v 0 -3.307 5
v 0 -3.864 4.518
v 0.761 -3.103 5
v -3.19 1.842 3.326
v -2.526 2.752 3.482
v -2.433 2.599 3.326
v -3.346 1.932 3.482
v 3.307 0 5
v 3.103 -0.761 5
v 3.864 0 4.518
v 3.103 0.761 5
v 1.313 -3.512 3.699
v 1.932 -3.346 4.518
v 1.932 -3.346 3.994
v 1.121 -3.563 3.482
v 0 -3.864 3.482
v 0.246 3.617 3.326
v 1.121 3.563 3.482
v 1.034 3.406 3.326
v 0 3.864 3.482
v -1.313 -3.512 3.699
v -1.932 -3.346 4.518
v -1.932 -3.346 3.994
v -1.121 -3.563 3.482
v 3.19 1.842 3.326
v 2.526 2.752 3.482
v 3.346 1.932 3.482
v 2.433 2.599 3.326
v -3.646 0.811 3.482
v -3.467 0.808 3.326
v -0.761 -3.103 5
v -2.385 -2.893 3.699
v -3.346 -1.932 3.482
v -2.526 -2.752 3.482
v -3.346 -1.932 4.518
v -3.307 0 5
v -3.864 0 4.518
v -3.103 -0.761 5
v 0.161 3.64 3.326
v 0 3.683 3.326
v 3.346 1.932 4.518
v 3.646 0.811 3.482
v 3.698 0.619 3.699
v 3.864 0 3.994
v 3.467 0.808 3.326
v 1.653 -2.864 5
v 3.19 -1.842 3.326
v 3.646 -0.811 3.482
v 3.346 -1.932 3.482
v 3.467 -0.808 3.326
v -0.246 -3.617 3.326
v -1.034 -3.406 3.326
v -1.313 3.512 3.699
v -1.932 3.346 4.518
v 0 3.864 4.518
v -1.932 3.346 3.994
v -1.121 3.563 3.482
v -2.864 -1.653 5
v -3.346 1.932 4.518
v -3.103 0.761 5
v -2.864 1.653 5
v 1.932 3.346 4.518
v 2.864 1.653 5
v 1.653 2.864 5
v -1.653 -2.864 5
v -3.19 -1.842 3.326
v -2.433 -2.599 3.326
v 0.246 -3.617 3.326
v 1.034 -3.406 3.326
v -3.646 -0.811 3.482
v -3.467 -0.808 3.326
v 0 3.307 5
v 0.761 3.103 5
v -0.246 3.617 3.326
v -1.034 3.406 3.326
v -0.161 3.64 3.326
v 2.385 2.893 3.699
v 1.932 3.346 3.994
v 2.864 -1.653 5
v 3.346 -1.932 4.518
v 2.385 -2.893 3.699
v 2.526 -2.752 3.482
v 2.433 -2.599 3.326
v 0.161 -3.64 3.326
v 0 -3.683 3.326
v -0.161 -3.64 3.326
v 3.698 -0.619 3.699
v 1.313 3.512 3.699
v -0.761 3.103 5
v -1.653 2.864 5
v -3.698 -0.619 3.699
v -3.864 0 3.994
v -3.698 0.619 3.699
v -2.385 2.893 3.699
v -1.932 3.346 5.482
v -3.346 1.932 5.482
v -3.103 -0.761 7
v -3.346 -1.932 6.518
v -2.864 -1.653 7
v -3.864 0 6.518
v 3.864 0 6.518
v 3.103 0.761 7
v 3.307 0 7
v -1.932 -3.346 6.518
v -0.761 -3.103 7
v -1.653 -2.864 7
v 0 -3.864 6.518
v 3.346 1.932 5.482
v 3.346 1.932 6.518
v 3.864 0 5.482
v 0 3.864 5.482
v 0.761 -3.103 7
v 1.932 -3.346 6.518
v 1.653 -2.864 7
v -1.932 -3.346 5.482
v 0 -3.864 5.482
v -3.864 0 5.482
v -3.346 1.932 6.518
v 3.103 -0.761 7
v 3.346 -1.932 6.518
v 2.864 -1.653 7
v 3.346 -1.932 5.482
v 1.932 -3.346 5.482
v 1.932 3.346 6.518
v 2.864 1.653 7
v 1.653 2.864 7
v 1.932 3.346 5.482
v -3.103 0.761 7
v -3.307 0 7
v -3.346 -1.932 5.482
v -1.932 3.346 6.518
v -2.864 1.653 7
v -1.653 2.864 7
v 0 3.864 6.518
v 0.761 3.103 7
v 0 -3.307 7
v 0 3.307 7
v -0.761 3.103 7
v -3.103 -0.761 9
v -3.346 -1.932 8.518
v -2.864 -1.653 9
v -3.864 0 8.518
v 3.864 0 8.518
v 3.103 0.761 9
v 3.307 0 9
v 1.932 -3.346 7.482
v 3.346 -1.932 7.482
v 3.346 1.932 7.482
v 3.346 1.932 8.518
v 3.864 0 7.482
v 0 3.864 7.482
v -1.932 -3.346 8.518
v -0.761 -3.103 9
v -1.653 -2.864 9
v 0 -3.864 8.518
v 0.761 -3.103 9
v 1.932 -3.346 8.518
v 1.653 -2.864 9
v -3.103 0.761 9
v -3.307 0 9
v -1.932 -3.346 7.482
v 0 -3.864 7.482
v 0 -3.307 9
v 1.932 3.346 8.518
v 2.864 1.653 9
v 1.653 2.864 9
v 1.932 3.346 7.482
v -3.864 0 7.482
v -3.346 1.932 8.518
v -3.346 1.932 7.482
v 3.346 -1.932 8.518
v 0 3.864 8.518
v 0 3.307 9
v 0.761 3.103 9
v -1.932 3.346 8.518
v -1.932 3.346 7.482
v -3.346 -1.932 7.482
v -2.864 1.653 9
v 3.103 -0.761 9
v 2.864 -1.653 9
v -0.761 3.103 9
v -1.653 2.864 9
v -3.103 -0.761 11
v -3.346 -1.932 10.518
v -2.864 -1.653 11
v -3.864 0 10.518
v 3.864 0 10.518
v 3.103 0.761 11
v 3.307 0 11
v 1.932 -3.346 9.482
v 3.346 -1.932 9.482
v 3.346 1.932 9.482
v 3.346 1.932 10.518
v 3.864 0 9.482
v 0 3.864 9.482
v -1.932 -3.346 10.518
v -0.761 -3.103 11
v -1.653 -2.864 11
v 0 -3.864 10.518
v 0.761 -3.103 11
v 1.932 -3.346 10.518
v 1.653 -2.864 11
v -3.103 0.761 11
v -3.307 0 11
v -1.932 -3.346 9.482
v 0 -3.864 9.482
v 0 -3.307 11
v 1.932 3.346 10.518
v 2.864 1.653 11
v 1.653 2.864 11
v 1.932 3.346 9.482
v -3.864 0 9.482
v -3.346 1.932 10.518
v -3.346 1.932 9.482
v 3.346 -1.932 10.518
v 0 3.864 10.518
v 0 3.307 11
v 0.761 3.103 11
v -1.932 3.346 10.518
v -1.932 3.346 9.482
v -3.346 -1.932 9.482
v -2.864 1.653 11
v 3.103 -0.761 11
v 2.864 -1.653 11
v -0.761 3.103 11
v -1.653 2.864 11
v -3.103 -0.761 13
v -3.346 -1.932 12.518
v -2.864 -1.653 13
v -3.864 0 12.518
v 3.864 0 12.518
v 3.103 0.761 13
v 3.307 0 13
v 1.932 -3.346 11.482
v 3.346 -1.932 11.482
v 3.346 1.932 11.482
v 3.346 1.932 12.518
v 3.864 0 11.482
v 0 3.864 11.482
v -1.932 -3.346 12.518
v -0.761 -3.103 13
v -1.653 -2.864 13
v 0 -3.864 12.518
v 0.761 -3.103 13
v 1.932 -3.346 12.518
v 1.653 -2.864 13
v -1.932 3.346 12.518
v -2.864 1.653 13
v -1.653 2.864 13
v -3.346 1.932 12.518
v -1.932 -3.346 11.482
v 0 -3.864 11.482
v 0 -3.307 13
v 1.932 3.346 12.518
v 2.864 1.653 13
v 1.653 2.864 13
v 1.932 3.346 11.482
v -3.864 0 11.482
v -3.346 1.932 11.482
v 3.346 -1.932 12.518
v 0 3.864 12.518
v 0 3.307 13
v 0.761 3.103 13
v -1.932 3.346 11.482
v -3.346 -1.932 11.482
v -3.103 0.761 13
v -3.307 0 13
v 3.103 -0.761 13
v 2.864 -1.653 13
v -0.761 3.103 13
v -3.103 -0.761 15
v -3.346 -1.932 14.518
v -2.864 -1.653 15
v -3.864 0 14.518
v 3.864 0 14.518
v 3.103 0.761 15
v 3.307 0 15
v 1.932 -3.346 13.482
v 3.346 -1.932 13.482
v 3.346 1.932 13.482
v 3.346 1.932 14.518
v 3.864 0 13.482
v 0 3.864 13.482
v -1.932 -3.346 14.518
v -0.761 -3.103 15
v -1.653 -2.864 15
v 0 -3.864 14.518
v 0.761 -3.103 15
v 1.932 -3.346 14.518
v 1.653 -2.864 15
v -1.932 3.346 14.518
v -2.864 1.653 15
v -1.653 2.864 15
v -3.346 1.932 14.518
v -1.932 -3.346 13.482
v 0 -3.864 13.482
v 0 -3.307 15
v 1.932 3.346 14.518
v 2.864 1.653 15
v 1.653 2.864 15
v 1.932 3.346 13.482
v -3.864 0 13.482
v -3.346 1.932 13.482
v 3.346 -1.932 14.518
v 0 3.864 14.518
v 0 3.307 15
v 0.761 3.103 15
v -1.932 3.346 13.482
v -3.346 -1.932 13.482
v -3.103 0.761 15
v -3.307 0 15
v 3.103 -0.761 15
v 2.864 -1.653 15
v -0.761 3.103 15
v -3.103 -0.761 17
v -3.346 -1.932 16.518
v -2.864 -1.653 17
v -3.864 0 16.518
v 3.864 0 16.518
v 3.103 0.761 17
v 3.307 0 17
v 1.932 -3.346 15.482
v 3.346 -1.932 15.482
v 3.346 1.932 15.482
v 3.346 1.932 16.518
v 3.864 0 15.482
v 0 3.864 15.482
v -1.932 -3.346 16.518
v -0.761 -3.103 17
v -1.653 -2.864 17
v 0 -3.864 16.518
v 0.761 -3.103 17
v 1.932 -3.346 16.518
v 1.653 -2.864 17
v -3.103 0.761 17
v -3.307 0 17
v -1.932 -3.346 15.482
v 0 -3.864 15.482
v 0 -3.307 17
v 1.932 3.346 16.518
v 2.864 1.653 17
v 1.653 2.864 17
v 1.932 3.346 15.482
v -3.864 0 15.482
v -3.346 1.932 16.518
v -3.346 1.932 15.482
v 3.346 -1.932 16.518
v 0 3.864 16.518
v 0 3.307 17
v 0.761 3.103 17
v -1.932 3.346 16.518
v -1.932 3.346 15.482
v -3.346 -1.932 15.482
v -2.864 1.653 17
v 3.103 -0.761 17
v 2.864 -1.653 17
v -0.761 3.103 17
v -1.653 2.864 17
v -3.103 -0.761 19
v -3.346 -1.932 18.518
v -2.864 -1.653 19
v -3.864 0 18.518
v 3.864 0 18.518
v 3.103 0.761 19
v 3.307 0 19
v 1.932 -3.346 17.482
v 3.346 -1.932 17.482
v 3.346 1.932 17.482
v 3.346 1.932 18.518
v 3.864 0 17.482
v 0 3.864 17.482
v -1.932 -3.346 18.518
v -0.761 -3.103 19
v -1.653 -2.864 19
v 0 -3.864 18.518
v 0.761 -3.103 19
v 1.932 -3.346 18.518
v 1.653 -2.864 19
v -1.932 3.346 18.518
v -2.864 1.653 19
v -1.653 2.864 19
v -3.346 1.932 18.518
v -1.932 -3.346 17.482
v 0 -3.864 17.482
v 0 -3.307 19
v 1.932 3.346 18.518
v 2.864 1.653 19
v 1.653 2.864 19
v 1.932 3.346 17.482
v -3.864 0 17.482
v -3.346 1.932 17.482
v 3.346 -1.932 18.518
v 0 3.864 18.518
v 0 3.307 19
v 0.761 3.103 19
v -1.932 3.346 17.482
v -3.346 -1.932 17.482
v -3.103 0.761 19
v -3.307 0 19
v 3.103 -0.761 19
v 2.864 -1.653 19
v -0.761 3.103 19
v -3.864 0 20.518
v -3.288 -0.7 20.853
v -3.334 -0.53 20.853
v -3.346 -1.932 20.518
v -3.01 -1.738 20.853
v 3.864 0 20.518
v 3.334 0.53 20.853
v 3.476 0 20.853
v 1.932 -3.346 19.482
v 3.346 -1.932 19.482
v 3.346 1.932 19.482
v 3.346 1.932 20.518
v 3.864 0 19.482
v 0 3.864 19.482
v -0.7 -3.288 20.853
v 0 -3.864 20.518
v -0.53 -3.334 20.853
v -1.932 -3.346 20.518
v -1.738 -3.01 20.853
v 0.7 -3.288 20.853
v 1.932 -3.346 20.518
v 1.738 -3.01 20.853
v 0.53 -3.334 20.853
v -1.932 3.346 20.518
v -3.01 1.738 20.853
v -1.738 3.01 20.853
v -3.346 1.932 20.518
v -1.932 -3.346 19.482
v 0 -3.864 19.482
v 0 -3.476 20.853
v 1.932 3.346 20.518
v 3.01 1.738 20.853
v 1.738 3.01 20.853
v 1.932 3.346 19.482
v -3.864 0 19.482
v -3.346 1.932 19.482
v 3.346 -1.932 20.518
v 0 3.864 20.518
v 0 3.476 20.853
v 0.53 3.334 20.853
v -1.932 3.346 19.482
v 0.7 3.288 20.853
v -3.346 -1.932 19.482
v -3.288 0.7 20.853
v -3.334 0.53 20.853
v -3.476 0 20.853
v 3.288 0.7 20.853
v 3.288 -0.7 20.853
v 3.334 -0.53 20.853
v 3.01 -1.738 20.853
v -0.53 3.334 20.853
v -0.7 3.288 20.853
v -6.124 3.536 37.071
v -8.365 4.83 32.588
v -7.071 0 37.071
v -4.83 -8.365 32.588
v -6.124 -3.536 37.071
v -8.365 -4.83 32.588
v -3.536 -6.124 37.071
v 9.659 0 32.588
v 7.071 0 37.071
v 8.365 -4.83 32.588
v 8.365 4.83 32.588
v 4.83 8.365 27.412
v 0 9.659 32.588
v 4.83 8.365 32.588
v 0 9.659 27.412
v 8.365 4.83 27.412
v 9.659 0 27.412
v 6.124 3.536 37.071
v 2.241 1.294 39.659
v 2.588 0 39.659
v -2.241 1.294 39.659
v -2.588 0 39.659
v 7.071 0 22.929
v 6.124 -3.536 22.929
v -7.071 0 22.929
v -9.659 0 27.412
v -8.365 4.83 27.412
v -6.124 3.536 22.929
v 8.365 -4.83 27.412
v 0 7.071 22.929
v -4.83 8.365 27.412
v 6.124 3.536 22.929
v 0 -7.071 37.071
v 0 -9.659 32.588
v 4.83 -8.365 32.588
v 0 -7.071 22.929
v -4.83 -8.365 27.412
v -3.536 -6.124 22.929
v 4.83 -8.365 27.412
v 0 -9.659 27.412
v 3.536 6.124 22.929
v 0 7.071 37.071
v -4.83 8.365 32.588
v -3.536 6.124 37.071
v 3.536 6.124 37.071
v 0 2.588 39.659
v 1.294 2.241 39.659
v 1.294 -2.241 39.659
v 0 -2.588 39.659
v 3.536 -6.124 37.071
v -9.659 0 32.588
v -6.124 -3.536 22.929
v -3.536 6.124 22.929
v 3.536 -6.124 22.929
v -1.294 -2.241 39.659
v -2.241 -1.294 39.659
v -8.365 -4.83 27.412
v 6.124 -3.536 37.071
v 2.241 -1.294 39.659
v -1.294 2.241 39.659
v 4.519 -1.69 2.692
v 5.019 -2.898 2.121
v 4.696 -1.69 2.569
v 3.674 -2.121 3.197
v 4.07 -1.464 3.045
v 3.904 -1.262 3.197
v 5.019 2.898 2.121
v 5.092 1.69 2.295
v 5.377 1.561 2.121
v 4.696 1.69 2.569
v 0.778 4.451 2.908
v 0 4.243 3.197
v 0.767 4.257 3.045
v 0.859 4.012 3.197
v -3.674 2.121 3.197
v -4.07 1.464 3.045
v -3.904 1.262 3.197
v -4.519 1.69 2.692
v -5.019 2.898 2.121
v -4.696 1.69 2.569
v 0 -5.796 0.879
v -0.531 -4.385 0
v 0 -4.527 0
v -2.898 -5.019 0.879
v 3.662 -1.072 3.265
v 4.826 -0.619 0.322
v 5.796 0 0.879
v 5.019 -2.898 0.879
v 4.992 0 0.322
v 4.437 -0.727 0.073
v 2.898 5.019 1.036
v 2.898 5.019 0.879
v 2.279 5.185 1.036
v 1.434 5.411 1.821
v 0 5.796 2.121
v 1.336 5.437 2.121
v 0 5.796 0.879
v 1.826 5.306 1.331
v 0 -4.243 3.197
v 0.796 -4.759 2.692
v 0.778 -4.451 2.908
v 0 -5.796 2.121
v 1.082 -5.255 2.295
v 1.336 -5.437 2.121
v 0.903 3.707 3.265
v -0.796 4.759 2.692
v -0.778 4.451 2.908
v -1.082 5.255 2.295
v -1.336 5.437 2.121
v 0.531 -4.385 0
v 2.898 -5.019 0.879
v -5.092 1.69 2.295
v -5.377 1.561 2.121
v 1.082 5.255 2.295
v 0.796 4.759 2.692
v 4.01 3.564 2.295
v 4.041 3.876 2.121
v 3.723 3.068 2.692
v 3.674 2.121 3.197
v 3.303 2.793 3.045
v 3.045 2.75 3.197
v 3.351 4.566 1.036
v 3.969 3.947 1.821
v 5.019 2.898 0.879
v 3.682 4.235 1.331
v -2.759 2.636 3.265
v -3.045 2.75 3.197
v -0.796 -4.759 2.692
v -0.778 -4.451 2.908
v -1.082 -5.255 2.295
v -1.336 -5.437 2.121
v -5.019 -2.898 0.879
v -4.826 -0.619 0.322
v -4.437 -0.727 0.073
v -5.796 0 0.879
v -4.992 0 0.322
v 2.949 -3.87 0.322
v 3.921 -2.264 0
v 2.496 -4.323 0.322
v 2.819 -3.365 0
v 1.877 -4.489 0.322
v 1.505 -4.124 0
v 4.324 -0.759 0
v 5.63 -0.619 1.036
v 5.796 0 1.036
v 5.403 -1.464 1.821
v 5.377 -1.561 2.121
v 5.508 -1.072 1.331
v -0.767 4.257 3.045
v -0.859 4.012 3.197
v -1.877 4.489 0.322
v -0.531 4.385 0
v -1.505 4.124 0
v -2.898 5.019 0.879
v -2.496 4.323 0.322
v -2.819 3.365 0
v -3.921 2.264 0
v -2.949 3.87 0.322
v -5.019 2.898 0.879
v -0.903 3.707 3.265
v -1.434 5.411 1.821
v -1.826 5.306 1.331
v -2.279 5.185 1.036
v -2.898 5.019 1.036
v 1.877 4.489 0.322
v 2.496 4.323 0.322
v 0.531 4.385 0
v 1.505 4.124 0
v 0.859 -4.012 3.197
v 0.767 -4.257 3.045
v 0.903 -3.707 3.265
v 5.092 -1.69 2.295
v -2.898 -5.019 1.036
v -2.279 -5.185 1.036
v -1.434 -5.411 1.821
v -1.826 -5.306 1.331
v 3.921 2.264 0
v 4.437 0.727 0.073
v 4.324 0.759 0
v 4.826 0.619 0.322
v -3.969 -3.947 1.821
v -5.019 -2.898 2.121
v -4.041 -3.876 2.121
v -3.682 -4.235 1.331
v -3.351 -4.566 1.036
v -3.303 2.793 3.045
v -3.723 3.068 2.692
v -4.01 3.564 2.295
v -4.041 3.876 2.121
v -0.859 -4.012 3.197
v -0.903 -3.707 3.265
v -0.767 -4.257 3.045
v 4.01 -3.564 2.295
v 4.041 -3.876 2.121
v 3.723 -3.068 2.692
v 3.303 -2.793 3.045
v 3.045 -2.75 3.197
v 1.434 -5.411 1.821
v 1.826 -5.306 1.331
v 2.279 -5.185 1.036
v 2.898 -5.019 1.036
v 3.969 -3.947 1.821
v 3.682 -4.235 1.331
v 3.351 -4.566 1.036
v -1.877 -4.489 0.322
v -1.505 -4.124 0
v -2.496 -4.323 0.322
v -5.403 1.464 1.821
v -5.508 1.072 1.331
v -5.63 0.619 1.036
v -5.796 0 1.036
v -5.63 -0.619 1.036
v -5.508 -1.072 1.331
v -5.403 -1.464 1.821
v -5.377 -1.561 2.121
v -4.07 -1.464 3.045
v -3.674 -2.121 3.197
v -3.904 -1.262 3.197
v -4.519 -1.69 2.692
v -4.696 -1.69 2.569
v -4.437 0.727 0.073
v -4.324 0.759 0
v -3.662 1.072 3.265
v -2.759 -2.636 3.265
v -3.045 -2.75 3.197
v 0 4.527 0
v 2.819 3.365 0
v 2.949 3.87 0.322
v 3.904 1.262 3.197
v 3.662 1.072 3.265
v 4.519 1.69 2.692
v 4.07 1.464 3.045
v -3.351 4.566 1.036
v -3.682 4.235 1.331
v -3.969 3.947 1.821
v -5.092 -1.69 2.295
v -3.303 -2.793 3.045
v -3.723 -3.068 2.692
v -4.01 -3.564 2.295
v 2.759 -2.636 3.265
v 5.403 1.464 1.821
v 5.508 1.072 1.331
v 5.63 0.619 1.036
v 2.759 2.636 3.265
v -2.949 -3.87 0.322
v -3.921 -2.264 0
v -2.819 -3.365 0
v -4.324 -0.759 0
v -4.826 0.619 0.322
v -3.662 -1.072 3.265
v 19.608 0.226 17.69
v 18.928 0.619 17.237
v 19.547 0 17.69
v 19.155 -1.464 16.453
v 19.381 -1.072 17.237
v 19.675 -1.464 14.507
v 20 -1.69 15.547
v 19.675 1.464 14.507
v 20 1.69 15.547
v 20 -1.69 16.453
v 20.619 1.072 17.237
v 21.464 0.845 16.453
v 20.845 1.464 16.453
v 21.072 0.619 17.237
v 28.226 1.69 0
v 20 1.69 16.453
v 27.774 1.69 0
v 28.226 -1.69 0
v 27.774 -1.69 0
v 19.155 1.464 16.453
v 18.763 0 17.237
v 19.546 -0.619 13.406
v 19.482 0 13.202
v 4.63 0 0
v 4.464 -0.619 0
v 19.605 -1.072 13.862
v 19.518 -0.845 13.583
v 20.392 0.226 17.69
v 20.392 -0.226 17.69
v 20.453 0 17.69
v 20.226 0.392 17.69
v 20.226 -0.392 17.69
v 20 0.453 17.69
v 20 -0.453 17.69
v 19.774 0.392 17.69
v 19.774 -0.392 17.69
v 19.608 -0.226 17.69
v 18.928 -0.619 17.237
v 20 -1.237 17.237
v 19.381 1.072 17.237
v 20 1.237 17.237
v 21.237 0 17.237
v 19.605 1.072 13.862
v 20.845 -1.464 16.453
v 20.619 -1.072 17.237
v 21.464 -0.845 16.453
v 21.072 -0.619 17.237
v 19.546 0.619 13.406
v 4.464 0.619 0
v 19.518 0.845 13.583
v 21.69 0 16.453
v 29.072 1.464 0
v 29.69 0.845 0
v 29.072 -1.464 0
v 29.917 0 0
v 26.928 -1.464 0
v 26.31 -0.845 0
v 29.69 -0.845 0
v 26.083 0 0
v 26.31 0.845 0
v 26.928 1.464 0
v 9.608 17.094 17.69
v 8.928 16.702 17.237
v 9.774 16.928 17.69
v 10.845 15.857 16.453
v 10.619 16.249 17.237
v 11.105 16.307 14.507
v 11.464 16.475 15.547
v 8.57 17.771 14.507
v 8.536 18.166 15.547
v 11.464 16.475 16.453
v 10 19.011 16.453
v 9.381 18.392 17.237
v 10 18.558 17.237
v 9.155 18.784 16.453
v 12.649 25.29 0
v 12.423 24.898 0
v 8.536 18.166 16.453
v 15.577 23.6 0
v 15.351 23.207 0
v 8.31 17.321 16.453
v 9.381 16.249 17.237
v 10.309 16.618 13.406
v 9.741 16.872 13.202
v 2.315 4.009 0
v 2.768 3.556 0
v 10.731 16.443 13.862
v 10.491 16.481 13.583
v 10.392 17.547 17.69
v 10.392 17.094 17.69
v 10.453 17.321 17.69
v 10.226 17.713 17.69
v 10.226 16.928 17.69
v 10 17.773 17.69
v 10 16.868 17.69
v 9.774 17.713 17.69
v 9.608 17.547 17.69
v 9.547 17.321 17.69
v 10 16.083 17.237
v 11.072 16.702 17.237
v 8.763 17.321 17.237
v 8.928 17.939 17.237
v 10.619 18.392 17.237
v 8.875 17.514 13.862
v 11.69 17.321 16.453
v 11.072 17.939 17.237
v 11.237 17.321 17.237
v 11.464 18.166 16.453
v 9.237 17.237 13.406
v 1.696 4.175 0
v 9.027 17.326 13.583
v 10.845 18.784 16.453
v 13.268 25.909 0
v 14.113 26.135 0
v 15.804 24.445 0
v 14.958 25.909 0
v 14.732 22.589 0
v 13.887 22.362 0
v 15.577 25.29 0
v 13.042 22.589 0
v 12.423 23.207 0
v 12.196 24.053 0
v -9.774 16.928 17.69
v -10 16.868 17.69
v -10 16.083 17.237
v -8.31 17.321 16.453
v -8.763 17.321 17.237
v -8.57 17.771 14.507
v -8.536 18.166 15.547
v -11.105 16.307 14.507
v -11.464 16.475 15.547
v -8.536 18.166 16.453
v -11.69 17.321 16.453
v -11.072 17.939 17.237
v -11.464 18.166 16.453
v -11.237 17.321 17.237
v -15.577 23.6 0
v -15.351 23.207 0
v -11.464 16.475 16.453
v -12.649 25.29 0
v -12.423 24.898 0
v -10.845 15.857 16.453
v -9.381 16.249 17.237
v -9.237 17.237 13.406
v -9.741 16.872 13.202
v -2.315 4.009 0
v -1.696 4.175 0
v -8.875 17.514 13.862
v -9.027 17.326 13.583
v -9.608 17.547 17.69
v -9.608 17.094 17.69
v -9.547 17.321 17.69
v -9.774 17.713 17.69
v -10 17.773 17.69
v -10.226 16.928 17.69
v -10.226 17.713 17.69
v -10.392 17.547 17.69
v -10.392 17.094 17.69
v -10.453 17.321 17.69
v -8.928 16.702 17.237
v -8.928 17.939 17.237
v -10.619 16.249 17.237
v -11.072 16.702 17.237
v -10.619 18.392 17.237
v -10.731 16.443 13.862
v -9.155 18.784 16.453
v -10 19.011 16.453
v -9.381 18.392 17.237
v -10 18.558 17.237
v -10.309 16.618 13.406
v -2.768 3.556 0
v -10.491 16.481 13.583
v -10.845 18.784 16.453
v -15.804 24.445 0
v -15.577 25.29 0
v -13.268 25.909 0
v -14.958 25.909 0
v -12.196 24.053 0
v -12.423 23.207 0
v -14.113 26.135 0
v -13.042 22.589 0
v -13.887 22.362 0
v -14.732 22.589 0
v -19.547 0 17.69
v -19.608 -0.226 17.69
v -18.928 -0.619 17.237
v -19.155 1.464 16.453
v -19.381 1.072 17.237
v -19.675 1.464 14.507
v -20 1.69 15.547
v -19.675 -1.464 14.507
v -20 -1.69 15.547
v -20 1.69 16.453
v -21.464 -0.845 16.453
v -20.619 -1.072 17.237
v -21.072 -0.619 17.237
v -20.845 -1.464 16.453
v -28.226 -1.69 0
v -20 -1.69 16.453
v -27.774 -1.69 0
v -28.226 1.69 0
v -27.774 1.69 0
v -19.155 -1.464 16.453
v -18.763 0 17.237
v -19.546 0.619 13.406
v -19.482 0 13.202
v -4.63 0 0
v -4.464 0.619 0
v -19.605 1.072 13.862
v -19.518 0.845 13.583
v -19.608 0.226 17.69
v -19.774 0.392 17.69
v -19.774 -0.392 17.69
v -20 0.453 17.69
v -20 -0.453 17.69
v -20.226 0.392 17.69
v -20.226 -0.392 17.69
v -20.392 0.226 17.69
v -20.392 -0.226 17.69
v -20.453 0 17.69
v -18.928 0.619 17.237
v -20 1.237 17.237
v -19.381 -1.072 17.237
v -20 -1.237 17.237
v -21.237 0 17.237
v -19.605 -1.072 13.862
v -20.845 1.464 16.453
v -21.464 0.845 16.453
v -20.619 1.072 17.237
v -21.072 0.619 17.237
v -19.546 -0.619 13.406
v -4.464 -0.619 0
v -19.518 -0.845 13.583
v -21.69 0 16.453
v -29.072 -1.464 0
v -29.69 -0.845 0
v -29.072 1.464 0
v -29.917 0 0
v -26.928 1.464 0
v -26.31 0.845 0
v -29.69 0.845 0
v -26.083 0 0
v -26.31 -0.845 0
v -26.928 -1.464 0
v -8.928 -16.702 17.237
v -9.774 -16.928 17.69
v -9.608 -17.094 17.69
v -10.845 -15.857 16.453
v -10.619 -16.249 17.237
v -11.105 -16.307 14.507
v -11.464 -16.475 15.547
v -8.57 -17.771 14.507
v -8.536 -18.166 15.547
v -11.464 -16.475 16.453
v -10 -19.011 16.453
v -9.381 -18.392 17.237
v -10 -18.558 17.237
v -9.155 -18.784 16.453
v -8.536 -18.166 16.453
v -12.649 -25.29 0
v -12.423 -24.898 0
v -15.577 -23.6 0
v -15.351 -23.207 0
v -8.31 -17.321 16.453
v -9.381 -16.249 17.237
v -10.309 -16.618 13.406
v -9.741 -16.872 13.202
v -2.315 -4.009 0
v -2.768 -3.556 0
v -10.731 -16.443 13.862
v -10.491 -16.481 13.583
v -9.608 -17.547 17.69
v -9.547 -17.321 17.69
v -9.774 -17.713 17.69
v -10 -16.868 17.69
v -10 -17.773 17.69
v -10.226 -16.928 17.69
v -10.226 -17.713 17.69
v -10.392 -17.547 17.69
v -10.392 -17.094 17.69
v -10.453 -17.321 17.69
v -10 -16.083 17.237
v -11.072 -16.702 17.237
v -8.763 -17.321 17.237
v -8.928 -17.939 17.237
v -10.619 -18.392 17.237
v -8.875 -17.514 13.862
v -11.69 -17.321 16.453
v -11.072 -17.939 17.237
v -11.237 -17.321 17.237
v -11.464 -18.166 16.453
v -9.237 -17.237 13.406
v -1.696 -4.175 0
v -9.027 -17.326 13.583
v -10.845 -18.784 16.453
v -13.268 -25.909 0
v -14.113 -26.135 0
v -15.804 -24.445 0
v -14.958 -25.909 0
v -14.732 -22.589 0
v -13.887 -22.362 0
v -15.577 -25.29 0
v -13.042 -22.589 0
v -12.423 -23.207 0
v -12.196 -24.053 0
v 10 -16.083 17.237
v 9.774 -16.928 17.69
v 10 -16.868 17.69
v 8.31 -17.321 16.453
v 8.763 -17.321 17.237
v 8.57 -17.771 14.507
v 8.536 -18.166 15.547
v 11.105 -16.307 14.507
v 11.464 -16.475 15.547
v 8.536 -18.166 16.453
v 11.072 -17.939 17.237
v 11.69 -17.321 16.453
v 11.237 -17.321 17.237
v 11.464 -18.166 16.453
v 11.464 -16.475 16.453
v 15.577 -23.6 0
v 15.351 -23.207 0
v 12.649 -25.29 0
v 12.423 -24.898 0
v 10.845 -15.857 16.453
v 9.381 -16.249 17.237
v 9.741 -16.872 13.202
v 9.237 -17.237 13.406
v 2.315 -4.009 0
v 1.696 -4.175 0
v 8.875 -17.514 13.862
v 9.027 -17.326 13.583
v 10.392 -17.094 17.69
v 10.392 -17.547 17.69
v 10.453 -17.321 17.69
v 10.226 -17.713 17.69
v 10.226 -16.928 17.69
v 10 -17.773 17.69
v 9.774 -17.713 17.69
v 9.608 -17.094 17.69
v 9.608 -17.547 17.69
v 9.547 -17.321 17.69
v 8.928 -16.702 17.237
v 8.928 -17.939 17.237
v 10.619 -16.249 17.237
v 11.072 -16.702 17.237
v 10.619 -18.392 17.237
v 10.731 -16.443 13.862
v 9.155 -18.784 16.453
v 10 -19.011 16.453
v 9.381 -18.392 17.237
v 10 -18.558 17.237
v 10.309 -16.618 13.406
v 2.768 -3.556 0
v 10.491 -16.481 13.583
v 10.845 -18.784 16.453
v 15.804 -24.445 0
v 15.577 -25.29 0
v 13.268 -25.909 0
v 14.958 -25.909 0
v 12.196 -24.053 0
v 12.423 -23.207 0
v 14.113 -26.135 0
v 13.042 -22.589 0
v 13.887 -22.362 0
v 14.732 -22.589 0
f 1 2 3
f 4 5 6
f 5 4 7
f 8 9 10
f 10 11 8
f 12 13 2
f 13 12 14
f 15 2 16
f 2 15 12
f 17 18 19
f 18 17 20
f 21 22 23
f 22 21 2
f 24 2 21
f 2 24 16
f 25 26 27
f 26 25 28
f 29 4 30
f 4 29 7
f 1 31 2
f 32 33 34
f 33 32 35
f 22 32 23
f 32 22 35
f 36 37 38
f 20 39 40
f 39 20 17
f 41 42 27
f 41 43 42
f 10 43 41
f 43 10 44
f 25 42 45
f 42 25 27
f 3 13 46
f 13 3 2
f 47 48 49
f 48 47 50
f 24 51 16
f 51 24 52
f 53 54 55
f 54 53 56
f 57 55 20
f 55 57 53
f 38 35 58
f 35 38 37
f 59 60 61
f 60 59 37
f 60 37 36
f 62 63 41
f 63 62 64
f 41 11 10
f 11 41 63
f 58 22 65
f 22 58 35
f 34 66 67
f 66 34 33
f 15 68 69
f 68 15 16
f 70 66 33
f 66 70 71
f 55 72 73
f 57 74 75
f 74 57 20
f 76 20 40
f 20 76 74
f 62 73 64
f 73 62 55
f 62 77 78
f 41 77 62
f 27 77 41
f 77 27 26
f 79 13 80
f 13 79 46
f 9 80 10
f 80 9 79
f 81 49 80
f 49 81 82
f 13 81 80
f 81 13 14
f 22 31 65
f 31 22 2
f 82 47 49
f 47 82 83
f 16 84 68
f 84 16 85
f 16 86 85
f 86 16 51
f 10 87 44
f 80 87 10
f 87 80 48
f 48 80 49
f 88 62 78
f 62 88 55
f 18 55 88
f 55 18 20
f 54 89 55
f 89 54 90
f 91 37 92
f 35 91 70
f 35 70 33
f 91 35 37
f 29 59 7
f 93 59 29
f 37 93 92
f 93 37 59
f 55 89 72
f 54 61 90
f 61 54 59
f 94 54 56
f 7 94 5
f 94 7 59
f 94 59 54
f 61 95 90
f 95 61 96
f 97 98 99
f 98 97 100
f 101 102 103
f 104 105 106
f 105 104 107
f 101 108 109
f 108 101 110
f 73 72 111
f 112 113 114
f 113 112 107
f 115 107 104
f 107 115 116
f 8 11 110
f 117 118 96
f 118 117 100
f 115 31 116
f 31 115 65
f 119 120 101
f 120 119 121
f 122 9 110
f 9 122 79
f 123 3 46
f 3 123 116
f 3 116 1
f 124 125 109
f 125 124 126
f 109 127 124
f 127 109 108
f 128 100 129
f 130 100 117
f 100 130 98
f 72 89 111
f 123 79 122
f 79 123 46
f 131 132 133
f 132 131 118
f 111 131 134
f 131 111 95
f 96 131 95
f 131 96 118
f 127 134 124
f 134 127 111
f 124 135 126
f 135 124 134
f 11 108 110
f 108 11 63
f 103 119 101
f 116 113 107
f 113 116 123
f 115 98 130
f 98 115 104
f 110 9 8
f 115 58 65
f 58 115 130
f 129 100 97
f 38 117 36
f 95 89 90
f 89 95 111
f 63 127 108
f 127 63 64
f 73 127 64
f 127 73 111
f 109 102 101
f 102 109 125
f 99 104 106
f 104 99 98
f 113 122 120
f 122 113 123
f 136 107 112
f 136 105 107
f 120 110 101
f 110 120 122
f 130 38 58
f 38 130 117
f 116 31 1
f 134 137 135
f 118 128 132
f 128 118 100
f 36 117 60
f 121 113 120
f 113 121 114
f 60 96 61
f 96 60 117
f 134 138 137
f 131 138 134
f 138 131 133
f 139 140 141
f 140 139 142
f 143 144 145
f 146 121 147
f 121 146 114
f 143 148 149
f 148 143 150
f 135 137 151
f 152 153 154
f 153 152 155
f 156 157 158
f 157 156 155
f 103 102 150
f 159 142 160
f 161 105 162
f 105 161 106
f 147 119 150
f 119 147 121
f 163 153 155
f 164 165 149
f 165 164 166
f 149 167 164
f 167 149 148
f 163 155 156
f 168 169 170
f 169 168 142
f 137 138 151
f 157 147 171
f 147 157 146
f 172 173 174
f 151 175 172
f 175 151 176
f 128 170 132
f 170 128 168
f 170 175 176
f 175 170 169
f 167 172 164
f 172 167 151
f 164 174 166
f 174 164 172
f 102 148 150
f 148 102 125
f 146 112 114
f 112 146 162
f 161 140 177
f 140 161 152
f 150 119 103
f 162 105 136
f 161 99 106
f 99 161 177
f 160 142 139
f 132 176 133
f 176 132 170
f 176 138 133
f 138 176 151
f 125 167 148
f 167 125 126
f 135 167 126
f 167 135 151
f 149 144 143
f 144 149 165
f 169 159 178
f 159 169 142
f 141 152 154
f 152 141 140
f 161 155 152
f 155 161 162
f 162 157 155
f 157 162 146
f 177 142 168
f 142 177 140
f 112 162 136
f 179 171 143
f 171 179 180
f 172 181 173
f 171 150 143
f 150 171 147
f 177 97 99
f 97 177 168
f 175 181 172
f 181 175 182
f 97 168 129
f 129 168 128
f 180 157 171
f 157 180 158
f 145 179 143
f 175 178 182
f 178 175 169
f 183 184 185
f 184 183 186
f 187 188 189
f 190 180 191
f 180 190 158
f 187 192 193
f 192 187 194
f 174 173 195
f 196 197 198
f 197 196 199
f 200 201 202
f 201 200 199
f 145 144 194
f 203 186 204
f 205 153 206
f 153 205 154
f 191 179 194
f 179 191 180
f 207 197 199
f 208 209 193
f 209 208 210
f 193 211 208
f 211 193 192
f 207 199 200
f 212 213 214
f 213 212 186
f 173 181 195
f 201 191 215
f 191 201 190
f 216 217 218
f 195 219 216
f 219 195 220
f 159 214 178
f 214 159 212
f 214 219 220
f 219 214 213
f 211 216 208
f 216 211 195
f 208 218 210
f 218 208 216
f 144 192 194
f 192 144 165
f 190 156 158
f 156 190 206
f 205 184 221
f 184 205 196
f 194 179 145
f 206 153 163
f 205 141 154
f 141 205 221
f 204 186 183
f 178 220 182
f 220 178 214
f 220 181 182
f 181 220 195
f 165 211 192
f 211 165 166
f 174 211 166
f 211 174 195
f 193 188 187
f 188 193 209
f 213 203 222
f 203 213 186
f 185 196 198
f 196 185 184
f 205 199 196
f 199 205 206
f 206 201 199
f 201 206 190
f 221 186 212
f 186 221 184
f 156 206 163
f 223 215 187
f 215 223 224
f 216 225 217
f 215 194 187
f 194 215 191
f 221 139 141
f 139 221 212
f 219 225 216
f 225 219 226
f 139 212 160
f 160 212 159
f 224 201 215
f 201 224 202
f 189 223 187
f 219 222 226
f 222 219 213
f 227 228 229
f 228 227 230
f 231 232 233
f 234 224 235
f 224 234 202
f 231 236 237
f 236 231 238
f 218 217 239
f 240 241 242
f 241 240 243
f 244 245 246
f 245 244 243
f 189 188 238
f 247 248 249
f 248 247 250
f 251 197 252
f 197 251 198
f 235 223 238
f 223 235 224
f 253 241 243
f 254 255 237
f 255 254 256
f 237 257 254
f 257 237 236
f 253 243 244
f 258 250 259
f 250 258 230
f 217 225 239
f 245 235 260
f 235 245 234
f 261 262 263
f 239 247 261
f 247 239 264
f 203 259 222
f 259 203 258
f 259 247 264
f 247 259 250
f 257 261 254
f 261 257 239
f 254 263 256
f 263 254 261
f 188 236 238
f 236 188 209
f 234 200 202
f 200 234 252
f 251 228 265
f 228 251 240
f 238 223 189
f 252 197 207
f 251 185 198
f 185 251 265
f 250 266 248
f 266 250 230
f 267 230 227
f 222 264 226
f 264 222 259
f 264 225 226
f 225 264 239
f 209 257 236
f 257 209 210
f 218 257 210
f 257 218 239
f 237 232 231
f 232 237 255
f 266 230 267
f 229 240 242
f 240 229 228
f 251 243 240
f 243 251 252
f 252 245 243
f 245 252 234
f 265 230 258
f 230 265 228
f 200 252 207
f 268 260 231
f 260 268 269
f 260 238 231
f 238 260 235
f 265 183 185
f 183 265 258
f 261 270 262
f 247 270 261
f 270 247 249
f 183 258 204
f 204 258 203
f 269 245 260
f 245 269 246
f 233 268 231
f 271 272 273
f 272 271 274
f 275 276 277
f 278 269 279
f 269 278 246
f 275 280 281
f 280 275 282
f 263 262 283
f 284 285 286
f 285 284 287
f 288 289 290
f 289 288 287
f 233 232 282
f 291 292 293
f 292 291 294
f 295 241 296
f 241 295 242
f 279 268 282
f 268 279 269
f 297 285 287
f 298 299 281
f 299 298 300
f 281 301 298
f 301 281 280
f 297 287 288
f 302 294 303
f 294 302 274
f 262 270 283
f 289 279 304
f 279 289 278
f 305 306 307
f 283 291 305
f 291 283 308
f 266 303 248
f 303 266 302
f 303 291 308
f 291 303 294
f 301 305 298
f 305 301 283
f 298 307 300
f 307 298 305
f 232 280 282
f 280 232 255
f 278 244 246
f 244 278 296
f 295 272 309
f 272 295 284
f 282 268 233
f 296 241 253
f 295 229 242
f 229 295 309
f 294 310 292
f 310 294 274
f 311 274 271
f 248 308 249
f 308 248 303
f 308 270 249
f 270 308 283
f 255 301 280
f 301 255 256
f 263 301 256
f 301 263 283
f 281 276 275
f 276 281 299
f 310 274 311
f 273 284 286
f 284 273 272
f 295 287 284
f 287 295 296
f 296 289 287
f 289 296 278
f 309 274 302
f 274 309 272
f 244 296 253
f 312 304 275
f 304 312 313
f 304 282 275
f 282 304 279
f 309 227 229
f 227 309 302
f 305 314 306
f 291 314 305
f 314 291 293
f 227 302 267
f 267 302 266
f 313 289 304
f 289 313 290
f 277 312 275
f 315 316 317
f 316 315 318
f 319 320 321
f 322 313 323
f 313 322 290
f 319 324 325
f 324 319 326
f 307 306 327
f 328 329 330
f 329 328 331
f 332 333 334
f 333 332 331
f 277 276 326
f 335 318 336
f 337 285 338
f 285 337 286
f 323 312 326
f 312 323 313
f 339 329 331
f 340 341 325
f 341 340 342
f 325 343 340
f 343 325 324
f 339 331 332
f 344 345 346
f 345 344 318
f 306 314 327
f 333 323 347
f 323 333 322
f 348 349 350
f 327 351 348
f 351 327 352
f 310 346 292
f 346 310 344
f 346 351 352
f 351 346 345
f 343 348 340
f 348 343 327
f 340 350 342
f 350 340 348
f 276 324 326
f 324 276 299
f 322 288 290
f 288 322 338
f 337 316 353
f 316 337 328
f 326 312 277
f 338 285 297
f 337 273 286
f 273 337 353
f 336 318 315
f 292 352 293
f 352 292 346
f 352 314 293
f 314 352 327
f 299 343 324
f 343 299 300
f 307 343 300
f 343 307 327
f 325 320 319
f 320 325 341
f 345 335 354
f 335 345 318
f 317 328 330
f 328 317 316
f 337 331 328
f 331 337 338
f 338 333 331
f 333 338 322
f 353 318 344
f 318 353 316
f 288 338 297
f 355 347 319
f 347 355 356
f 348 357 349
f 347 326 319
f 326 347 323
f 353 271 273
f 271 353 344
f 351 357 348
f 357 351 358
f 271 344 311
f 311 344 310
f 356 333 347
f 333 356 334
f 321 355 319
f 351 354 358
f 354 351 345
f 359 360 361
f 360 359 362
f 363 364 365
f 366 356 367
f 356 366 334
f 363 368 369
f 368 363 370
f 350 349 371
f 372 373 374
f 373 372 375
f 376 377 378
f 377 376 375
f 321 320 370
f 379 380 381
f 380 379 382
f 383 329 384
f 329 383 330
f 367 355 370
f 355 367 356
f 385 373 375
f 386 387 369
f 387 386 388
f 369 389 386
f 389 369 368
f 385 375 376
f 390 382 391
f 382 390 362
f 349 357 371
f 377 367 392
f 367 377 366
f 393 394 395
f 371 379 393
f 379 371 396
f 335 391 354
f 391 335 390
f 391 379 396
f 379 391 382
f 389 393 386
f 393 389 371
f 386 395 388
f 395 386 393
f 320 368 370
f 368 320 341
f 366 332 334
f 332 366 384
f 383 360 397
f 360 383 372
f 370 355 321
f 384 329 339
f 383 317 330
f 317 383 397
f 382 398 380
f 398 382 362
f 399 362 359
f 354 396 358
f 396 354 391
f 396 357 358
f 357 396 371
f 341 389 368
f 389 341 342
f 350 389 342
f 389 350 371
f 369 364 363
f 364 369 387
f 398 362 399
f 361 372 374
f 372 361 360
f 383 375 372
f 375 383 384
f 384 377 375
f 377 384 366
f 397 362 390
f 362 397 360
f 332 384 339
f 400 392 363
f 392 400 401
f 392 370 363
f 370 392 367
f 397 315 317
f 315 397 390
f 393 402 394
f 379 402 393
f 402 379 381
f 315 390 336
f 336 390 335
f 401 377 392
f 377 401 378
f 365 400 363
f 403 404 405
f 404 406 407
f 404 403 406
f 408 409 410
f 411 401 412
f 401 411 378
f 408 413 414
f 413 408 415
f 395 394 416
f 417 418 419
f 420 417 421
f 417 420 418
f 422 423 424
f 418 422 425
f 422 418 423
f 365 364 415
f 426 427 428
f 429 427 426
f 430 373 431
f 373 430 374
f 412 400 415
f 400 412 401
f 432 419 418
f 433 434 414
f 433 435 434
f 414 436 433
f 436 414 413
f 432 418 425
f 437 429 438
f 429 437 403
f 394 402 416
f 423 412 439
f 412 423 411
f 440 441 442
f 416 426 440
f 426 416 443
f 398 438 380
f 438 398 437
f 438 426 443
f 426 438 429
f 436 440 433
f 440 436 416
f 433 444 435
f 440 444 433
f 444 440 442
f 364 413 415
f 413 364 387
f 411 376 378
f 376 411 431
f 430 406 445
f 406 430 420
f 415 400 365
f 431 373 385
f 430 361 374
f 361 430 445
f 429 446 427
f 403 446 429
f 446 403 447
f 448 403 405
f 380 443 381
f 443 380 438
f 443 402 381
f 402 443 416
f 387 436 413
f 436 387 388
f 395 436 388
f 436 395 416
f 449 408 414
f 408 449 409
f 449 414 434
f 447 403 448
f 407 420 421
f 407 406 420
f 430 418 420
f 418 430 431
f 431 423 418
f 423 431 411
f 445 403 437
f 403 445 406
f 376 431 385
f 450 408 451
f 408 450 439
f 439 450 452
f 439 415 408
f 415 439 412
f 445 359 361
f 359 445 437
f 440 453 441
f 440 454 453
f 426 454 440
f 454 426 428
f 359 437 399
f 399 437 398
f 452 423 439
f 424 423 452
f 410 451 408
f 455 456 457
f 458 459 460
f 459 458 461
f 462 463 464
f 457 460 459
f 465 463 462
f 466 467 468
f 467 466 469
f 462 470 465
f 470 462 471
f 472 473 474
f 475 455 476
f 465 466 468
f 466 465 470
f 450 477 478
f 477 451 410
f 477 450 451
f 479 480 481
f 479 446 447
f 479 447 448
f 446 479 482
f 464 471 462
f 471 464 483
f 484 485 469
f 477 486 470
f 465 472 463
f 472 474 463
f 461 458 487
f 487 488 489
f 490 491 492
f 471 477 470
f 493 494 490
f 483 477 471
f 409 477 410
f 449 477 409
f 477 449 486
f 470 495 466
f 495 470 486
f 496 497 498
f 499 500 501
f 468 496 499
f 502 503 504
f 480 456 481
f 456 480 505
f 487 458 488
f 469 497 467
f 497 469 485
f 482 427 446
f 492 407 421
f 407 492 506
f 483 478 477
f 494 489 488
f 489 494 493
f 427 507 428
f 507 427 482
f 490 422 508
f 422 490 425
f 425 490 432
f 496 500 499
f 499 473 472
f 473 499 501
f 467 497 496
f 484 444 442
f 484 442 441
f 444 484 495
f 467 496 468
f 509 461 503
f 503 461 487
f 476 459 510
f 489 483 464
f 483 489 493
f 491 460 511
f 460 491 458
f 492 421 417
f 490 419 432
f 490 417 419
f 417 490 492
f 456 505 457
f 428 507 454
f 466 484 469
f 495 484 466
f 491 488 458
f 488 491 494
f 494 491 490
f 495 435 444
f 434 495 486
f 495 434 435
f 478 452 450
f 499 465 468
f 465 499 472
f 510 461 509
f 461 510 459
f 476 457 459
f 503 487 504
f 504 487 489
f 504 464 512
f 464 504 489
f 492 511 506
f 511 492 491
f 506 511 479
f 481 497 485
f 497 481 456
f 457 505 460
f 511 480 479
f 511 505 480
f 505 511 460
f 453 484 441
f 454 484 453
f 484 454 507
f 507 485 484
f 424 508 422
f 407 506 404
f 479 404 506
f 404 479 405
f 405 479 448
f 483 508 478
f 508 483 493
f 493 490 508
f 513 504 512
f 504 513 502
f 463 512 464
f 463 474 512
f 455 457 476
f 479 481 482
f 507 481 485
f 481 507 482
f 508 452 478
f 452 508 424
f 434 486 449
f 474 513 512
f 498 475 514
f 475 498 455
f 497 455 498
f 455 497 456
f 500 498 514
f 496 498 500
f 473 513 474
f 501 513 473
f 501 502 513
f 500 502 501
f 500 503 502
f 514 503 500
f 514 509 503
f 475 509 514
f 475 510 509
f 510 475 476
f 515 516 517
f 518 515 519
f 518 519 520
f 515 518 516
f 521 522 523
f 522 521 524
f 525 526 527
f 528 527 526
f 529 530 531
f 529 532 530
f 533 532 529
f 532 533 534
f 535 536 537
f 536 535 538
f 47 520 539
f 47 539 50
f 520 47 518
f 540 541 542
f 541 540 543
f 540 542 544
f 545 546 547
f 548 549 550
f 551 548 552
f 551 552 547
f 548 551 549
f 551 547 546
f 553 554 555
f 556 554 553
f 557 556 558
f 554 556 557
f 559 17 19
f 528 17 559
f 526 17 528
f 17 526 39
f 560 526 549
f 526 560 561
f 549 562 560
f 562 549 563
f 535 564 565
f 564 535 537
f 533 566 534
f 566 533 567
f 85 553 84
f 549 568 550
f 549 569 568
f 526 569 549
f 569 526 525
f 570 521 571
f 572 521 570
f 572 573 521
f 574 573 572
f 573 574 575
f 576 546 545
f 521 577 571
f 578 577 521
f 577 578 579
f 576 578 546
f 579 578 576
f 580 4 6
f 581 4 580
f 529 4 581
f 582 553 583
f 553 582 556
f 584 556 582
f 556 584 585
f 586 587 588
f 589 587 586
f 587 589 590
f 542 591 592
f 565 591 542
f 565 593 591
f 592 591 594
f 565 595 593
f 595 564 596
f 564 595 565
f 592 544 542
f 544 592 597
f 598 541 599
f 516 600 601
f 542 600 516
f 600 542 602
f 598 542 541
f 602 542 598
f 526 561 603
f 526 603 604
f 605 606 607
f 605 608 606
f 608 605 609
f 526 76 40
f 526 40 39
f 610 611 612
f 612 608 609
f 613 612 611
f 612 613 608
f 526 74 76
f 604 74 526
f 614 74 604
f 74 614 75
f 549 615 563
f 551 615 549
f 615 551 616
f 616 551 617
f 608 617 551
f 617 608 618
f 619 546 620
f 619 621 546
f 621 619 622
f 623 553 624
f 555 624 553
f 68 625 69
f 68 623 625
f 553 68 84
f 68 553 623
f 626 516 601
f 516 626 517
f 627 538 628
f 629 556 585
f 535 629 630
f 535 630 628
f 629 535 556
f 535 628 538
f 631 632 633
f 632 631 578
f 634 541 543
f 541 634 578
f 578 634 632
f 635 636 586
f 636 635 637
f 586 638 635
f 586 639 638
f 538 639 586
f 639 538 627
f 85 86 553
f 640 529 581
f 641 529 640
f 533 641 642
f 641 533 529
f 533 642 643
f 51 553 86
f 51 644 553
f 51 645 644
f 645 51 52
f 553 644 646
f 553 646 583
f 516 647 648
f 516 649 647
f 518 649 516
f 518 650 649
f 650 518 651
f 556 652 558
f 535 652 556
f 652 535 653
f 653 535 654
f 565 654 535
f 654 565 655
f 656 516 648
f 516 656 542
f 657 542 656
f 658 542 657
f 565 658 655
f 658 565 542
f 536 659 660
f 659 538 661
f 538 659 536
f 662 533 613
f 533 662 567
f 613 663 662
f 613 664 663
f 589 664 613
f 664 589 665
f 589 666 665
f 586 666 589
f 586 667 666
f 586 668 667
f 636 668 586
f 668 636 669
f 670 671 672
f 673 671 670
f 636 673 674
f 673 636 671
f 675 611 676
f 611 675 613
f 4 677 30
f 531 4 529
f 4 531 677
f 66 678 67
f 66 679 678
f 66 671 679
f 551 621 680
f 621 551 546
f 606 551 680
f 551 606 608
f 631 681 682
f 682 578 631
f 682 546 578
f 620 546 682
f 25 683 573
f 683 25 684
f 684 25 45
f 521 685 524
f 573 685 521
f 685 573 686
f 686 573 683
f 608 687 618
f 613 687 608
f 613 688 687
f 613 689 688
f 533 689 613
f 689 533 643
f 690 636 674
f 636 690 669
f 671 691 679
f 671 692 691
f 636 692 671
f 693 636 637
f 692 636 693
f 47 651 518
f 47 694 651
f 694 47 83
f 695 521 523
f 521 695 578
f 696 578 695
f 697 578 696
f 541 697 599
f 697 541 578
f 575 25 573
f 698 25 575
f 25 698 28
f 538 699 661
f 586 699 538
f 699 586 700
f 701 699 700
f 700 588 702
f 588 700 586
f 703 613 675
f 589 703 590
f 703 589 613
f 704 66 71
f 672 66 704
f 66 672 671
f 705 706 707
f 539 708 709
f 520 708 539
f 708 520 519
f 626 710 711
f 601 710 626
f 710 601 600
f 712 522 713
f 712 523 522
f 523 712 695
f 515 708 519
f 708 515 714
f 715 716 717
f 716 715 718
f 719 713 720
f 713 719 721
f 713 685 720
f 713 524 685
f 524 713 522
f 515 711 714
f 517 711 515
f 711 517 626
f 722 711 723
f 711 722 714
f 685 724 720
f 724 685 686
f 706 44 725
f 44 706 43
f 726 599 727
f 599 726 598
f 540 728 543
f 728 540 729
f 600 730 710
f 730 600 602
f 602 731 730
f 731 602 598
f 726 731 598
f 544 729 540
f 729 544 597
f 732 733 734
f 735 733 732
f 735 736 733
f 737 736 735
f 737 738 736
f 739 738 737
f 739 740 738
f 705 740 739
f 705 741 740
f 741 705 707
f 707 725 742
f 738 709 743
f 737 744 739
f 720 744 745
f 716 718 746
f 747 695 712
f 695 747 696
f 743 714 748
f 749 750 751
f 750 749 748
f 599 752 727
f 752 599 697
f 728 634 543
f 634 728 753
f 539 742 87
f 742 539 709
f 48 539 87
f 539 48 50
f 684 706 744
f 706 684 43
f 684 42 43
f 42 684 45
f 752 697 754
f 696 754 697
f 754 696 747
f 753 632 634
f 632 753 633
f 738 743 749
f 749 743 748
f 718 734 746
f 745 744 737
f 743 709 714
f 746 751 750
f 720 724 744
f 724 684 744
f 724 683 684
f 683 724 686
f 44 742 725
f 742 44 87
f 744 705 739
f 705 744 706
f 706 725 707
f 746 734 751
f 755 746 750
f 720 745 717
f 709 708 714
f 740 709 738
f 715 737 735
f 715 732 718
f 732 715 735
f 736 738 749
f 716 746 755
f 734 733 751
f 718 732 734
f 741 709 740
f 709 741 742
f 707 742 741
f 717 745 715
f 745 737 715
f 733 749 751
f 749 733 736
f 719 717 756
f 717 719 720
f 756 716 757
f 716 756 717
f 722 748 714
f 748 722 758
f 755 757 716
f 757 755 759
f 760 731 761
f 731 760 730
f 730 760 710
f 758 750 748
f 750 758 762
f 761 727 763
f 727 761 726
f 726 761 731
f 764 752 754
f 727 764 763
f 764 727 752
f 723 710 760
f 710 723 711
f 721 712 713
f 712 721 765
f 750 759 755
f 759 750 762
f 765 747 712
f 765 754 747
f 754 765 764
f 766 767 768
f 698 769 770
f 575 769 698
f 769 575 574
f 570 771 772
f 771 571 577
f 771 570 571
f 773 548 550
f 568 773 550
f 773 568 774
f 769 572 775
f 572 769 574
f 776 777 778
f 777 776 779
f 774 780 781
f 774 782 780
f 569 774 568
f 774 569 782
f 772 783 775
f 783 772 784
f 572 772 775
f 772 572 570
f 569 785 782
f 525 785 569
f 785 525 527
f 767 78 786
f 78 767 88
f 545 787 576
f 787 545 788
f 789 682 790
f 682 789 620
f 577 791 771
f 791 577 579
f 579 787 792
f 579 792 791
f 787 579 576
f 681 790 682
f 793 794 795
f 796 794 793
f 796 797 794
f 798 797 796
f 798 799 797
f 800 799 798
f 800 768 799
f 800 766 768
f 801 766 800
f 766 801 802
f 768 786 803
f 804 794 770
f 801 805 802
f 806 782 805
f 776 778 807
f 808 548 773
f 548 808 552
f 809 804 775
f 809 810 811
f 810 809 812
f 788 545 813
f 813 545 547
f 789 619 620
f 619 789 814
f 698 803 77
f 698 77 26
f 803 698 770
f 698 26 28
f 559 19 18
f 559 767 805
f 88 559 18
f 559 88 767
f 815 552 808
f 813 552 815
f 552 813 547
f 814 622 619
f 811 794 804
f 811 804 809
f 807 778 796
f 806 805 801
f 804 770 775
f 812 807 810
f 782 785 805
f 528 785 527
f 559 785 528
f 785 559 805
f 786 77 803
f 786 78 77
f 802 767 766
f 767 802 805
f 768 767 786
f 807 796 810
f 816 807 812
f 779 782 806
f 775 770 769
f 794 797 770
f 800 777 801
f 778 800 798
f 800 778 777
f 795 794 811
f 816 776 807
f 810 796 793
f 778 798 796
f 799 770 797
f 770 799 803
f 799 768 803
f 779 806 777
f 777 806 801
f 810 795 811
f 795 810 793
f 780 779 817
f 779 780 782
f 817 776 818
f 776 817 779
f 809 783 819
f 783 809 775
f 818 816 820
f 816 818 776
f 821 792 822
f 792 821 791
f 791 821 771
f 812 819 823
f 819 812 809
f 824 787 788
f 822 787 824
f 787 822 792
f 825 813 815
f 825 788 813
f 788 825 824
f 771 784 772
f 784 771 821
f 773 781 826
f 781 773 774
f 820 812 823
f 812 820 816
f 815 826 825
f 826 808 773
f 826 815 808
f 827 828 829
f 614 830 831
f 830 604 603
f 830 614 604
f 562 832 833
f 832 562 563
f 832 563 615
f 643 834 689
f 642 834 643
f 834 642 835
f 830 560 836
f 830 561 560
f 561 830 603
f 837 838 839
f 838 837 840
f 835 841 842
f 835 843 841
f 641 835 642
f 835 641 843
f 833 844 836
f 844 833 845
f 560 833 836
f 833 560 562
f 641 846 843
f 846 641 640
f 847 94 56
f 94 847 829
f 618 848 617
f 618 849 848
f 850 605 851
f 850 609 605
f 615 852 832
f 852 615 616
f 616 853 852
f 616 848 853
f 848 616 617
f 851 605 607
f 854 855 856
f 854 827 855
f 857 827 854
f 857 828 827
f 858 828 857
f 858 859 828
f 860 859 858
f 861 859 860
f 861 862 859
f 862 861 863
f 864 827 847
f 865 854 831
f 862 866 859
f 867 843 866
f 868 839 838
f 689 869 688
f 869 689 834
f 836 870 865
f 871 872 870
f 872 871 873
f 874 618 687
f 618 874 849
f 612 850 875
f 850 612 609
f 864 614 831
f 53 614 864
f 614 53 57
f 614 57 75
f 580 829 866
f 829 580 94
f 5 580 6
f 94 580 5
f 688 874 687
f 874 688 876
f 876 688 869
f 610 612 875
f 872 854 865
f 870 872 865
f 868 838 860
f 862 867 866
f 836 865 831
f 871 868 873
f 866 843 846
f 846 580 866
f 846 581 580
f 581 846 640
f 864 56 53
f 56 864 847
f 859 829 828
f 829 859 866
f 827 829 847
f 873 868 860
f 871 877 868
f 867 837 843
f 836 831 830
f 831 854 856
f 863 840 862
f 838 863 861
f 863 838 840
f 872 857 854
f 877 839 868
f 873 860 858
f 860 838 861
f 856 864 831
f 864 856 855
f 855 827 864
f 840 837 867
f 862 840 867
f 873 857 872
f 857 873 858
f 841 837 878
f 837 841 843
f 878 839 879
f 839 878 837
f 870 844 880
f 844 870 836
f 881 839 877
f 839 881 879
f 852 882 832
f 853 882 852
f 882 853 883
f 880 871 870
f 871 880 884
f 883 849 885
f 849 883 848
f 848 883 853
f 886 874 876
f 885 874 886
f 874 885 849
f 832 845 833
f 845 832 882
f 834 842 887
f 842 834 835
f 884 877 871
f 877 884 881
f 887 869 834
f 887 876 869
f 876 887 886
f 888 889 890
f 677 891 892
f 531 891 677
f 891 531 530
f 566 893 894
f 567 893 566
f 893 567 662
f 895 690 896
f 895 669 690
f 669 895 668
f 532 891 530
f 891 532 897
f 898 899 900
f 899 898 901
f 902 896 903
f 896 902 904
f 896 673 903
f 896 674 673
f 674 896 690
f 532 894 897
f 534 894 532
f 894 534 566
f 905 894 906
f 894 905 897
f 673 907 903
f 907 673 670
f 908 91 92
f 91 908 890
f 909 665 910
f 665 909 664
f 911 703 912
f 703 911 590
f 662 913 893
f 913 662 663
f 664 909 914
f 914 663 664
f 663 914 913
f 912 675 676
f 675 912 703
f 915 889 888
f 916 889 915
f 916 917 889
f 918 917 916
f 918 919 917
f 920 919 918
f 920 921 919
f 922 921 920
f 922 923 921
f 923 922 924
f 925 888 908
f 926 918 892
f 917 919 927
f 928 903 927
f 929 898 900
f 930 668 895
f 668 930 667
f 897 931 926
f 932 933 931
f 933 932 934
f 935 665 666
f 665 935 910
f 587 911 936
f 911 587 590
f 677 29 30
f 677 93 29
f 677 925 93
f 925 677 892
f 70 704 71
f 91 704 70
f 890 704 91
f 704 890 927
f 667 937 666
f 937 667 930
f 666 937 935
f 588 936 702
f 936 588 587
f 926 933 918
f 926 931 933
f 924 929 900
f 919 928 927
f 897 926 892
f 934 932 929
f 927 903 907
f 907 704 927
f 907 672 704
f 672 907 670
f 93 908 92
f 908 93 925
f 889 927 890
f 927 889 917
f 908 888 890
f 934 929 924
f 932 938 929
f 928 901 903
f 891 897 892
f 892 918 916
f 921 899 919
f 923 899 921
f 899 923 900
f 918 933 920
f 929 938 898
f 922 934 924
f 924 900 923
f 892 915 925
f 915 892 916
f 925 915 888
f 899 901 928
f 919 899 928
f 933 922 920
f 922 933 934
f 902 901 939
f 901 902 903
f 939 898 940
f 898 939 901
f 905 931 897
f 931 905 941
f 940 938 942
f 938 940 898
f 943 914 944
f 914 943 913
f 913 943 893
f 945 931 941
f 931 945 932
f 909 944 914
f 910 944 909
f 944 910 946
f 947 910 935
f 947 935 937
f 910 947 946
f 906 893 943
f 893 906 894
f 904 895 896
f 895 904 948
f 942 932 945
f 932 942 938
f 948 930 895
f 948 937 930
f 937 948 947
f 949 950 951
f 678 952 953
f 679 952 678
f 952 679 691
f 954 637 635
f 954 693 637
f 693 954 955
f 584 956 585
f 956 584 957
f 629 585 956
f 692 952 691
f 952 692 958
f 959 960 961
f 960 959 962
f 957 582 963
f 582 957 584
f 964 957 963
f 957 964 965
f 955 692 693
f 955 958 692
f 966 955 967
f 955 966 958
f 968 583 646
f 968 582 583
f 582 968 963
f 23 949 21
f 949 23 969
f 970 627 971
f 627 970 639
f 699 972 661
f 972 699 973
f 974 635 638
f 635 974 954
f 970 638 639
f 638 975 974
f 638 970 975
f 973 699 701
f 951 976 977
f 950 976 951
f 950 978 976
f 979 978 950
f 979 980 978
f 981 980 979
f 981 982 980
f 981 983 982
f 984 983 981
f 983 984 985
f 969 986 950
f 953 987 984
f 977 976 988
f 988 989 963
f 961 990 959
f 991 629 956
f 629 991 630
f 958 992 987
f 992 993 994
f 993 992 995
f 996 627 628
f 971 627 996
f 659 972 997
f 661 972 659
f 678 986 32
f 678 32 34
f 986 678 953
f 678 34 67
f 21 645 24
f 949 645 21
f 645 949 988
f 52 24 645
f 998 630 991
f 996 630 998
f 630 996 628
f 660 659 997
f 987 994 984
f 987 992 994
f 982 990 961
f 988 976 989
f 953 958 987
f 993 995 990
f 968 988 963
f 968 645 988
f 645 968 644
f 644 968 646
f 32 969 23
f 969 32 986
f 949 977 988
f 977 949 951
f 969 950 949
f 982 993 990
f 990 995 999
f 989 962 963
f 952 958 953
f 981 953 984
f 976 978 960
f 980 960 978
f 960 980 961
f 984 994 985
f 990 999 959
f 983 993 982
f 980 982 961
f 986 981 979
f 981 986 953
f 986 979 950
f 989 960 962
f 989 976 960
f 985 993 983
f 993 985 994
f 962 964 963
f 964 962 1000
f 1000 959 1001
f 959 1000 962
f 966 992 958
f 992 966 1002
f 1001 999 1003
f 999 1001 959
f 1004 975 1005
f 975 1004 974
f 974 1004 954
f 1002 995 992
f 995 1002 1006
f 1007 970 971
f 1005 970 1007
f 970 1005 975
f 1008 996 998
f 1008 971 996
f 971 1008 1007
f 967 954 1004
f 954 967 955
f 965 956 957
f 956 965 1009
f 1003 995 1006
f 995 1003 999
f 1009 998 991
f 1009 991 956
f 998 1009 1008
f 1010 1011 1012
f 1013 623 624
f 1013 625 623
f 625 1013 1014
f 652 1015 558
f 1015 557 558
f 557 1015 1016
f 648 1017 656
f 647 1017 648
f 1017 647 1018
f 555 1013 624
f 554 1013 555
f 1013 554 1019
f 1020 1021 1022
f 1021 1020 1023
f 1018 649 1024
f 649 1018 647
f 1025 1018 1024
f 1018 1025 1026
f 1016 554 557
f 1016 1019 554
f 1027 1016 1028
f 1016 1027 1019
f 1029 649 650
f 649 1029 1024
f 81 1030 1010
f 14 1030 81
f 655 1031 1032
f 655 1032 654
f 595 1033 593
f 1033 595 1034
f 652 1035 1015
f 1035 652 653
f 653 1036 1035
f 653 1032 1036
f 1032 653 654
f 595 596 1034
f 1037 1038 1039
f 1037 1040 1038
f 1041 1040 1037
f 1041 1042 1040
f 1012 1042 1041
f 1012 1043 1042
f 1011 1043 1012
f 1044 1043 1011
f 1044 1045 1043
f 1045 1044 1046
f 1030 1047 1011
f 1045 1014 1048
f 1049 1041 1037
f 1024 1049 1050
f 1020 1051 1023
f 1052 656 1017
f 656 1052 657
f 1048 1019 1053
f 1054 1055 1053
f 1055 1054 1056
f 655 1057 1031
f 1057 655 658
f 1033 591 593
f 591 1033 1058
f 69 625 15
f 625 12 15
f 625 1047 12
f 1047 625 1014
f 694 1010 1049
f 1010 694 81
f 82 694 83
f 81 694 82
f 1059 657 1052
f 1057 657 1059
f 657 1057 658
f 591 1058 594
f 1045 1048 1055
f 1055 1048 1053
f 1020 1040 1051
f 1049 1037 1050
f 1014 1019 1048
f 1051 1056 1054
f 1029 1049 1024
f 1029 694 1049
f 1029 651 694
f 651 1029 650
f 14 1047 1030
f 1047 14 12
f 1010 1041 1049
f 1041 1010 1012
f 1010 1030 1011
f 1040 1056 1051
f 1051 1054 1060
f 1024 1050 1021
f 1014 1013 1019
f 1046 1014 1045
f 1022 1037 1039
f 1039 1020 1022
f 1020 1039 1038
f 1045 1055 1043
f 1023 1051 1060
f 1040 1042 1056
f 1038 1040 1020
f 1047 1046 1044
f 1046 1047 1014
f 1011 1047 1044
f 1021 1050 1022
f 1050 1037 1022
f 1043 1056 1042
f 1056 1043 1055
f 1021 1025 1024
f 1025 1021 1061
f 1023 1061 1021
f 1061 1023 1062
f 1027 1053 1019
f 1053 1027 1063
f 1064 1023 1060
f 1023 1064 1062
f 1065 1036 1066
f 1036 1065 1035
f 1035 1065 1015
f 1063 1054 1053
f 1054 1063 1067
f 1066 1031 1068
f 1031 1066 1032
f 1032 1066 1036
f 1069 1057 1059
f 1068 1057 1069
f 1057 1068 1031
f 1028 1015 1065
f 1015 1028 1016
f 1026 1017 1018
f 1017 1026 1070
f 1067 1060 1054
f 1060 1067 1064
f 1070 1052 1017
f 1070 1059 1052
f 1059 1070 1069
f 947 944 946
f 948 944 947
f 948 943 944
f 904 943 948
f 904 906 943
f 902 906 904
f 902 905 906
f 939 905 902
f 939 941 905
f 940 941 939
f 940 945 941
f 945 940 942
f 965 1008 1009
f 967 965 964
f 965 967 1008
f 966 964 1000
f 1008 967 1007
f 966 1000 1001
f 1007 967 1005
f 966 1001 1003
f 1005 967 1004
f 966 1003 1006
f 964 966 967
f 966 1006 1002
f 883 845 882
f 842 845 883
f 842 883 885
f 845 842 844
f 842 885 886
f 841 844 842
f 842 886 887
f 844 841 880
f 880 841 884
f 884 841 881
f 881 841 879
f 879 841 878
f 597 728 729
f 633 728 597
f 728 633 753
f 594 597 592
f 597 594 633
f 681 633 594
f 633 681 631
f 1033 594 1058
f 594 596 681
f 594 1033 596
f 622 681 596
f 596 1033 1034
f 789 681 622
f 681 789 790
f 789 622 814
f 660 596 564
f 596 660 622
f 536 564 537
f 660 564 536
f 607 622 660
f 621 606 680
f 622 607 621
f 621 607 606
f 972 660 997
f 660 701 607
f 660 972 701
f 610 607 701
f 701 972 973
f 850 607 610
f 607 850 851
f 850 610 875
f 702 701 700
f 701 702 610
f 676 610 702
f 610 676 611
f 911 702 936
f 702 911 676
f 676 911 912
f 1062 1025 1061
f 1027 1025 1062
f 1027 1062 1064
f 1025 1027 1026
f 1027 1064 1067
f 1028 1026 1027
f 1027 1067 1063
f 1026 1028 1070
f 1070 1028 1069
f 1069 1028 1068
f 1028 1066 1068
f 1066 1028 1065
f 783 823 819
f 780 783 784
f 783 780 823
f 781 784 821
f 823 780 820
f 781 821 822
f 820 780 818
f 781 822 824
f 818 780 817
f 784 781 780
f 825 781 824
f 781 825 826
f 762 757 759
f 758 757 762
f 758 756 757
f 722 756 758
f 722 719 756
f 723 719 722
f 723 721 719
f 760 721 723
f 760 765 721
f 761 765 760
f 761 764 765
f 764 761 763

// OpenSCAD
// bacteriophage by erik wrenholt 2017-02-12
// license: creative commons - attribution

$fn = 12;

leg_count = 6;
leg_width = 1.75;

printable_phage();

module printable_phage() {
    // chop off the bottom of the legs so they are flat on the bottom.
    difference() {
        bacteriophage();
        translate([0,0,-5]) cube([100,100,10], center=true);
    }
}

module bacteriophage() {
    body();
    for(i=[0:leg_count]) {
        rotate((360 / leg_count) * i, [0,0,1])
            leg();
    }
 }

module body() {
    
    // spherical head
    translate([0,0,30]) 
        sphere(10, $fn=12);
    
    // base-plate
    translate([0,0,1.5])
        scale([1,1,0.4])
            rotate(30, [0,0,1])
                sphere(6, $fn=12);

    // helical sheath
    for(i=[2:10]) {
        translate([0,0,i*2])
            scale([1,1,0.5])
                sphere(4);
    }

}

module leg() {
    union() {
        hull() {
            translate([2,0,0]) sphere(leg_width);
            translate([20,0,16]) sphere(leg_width);
        }
        hull() {
            translate([20,0,16]) sphere(leg_width);
            translate([30,0,-4]) sphere(leg_width);
        }
    }
}
